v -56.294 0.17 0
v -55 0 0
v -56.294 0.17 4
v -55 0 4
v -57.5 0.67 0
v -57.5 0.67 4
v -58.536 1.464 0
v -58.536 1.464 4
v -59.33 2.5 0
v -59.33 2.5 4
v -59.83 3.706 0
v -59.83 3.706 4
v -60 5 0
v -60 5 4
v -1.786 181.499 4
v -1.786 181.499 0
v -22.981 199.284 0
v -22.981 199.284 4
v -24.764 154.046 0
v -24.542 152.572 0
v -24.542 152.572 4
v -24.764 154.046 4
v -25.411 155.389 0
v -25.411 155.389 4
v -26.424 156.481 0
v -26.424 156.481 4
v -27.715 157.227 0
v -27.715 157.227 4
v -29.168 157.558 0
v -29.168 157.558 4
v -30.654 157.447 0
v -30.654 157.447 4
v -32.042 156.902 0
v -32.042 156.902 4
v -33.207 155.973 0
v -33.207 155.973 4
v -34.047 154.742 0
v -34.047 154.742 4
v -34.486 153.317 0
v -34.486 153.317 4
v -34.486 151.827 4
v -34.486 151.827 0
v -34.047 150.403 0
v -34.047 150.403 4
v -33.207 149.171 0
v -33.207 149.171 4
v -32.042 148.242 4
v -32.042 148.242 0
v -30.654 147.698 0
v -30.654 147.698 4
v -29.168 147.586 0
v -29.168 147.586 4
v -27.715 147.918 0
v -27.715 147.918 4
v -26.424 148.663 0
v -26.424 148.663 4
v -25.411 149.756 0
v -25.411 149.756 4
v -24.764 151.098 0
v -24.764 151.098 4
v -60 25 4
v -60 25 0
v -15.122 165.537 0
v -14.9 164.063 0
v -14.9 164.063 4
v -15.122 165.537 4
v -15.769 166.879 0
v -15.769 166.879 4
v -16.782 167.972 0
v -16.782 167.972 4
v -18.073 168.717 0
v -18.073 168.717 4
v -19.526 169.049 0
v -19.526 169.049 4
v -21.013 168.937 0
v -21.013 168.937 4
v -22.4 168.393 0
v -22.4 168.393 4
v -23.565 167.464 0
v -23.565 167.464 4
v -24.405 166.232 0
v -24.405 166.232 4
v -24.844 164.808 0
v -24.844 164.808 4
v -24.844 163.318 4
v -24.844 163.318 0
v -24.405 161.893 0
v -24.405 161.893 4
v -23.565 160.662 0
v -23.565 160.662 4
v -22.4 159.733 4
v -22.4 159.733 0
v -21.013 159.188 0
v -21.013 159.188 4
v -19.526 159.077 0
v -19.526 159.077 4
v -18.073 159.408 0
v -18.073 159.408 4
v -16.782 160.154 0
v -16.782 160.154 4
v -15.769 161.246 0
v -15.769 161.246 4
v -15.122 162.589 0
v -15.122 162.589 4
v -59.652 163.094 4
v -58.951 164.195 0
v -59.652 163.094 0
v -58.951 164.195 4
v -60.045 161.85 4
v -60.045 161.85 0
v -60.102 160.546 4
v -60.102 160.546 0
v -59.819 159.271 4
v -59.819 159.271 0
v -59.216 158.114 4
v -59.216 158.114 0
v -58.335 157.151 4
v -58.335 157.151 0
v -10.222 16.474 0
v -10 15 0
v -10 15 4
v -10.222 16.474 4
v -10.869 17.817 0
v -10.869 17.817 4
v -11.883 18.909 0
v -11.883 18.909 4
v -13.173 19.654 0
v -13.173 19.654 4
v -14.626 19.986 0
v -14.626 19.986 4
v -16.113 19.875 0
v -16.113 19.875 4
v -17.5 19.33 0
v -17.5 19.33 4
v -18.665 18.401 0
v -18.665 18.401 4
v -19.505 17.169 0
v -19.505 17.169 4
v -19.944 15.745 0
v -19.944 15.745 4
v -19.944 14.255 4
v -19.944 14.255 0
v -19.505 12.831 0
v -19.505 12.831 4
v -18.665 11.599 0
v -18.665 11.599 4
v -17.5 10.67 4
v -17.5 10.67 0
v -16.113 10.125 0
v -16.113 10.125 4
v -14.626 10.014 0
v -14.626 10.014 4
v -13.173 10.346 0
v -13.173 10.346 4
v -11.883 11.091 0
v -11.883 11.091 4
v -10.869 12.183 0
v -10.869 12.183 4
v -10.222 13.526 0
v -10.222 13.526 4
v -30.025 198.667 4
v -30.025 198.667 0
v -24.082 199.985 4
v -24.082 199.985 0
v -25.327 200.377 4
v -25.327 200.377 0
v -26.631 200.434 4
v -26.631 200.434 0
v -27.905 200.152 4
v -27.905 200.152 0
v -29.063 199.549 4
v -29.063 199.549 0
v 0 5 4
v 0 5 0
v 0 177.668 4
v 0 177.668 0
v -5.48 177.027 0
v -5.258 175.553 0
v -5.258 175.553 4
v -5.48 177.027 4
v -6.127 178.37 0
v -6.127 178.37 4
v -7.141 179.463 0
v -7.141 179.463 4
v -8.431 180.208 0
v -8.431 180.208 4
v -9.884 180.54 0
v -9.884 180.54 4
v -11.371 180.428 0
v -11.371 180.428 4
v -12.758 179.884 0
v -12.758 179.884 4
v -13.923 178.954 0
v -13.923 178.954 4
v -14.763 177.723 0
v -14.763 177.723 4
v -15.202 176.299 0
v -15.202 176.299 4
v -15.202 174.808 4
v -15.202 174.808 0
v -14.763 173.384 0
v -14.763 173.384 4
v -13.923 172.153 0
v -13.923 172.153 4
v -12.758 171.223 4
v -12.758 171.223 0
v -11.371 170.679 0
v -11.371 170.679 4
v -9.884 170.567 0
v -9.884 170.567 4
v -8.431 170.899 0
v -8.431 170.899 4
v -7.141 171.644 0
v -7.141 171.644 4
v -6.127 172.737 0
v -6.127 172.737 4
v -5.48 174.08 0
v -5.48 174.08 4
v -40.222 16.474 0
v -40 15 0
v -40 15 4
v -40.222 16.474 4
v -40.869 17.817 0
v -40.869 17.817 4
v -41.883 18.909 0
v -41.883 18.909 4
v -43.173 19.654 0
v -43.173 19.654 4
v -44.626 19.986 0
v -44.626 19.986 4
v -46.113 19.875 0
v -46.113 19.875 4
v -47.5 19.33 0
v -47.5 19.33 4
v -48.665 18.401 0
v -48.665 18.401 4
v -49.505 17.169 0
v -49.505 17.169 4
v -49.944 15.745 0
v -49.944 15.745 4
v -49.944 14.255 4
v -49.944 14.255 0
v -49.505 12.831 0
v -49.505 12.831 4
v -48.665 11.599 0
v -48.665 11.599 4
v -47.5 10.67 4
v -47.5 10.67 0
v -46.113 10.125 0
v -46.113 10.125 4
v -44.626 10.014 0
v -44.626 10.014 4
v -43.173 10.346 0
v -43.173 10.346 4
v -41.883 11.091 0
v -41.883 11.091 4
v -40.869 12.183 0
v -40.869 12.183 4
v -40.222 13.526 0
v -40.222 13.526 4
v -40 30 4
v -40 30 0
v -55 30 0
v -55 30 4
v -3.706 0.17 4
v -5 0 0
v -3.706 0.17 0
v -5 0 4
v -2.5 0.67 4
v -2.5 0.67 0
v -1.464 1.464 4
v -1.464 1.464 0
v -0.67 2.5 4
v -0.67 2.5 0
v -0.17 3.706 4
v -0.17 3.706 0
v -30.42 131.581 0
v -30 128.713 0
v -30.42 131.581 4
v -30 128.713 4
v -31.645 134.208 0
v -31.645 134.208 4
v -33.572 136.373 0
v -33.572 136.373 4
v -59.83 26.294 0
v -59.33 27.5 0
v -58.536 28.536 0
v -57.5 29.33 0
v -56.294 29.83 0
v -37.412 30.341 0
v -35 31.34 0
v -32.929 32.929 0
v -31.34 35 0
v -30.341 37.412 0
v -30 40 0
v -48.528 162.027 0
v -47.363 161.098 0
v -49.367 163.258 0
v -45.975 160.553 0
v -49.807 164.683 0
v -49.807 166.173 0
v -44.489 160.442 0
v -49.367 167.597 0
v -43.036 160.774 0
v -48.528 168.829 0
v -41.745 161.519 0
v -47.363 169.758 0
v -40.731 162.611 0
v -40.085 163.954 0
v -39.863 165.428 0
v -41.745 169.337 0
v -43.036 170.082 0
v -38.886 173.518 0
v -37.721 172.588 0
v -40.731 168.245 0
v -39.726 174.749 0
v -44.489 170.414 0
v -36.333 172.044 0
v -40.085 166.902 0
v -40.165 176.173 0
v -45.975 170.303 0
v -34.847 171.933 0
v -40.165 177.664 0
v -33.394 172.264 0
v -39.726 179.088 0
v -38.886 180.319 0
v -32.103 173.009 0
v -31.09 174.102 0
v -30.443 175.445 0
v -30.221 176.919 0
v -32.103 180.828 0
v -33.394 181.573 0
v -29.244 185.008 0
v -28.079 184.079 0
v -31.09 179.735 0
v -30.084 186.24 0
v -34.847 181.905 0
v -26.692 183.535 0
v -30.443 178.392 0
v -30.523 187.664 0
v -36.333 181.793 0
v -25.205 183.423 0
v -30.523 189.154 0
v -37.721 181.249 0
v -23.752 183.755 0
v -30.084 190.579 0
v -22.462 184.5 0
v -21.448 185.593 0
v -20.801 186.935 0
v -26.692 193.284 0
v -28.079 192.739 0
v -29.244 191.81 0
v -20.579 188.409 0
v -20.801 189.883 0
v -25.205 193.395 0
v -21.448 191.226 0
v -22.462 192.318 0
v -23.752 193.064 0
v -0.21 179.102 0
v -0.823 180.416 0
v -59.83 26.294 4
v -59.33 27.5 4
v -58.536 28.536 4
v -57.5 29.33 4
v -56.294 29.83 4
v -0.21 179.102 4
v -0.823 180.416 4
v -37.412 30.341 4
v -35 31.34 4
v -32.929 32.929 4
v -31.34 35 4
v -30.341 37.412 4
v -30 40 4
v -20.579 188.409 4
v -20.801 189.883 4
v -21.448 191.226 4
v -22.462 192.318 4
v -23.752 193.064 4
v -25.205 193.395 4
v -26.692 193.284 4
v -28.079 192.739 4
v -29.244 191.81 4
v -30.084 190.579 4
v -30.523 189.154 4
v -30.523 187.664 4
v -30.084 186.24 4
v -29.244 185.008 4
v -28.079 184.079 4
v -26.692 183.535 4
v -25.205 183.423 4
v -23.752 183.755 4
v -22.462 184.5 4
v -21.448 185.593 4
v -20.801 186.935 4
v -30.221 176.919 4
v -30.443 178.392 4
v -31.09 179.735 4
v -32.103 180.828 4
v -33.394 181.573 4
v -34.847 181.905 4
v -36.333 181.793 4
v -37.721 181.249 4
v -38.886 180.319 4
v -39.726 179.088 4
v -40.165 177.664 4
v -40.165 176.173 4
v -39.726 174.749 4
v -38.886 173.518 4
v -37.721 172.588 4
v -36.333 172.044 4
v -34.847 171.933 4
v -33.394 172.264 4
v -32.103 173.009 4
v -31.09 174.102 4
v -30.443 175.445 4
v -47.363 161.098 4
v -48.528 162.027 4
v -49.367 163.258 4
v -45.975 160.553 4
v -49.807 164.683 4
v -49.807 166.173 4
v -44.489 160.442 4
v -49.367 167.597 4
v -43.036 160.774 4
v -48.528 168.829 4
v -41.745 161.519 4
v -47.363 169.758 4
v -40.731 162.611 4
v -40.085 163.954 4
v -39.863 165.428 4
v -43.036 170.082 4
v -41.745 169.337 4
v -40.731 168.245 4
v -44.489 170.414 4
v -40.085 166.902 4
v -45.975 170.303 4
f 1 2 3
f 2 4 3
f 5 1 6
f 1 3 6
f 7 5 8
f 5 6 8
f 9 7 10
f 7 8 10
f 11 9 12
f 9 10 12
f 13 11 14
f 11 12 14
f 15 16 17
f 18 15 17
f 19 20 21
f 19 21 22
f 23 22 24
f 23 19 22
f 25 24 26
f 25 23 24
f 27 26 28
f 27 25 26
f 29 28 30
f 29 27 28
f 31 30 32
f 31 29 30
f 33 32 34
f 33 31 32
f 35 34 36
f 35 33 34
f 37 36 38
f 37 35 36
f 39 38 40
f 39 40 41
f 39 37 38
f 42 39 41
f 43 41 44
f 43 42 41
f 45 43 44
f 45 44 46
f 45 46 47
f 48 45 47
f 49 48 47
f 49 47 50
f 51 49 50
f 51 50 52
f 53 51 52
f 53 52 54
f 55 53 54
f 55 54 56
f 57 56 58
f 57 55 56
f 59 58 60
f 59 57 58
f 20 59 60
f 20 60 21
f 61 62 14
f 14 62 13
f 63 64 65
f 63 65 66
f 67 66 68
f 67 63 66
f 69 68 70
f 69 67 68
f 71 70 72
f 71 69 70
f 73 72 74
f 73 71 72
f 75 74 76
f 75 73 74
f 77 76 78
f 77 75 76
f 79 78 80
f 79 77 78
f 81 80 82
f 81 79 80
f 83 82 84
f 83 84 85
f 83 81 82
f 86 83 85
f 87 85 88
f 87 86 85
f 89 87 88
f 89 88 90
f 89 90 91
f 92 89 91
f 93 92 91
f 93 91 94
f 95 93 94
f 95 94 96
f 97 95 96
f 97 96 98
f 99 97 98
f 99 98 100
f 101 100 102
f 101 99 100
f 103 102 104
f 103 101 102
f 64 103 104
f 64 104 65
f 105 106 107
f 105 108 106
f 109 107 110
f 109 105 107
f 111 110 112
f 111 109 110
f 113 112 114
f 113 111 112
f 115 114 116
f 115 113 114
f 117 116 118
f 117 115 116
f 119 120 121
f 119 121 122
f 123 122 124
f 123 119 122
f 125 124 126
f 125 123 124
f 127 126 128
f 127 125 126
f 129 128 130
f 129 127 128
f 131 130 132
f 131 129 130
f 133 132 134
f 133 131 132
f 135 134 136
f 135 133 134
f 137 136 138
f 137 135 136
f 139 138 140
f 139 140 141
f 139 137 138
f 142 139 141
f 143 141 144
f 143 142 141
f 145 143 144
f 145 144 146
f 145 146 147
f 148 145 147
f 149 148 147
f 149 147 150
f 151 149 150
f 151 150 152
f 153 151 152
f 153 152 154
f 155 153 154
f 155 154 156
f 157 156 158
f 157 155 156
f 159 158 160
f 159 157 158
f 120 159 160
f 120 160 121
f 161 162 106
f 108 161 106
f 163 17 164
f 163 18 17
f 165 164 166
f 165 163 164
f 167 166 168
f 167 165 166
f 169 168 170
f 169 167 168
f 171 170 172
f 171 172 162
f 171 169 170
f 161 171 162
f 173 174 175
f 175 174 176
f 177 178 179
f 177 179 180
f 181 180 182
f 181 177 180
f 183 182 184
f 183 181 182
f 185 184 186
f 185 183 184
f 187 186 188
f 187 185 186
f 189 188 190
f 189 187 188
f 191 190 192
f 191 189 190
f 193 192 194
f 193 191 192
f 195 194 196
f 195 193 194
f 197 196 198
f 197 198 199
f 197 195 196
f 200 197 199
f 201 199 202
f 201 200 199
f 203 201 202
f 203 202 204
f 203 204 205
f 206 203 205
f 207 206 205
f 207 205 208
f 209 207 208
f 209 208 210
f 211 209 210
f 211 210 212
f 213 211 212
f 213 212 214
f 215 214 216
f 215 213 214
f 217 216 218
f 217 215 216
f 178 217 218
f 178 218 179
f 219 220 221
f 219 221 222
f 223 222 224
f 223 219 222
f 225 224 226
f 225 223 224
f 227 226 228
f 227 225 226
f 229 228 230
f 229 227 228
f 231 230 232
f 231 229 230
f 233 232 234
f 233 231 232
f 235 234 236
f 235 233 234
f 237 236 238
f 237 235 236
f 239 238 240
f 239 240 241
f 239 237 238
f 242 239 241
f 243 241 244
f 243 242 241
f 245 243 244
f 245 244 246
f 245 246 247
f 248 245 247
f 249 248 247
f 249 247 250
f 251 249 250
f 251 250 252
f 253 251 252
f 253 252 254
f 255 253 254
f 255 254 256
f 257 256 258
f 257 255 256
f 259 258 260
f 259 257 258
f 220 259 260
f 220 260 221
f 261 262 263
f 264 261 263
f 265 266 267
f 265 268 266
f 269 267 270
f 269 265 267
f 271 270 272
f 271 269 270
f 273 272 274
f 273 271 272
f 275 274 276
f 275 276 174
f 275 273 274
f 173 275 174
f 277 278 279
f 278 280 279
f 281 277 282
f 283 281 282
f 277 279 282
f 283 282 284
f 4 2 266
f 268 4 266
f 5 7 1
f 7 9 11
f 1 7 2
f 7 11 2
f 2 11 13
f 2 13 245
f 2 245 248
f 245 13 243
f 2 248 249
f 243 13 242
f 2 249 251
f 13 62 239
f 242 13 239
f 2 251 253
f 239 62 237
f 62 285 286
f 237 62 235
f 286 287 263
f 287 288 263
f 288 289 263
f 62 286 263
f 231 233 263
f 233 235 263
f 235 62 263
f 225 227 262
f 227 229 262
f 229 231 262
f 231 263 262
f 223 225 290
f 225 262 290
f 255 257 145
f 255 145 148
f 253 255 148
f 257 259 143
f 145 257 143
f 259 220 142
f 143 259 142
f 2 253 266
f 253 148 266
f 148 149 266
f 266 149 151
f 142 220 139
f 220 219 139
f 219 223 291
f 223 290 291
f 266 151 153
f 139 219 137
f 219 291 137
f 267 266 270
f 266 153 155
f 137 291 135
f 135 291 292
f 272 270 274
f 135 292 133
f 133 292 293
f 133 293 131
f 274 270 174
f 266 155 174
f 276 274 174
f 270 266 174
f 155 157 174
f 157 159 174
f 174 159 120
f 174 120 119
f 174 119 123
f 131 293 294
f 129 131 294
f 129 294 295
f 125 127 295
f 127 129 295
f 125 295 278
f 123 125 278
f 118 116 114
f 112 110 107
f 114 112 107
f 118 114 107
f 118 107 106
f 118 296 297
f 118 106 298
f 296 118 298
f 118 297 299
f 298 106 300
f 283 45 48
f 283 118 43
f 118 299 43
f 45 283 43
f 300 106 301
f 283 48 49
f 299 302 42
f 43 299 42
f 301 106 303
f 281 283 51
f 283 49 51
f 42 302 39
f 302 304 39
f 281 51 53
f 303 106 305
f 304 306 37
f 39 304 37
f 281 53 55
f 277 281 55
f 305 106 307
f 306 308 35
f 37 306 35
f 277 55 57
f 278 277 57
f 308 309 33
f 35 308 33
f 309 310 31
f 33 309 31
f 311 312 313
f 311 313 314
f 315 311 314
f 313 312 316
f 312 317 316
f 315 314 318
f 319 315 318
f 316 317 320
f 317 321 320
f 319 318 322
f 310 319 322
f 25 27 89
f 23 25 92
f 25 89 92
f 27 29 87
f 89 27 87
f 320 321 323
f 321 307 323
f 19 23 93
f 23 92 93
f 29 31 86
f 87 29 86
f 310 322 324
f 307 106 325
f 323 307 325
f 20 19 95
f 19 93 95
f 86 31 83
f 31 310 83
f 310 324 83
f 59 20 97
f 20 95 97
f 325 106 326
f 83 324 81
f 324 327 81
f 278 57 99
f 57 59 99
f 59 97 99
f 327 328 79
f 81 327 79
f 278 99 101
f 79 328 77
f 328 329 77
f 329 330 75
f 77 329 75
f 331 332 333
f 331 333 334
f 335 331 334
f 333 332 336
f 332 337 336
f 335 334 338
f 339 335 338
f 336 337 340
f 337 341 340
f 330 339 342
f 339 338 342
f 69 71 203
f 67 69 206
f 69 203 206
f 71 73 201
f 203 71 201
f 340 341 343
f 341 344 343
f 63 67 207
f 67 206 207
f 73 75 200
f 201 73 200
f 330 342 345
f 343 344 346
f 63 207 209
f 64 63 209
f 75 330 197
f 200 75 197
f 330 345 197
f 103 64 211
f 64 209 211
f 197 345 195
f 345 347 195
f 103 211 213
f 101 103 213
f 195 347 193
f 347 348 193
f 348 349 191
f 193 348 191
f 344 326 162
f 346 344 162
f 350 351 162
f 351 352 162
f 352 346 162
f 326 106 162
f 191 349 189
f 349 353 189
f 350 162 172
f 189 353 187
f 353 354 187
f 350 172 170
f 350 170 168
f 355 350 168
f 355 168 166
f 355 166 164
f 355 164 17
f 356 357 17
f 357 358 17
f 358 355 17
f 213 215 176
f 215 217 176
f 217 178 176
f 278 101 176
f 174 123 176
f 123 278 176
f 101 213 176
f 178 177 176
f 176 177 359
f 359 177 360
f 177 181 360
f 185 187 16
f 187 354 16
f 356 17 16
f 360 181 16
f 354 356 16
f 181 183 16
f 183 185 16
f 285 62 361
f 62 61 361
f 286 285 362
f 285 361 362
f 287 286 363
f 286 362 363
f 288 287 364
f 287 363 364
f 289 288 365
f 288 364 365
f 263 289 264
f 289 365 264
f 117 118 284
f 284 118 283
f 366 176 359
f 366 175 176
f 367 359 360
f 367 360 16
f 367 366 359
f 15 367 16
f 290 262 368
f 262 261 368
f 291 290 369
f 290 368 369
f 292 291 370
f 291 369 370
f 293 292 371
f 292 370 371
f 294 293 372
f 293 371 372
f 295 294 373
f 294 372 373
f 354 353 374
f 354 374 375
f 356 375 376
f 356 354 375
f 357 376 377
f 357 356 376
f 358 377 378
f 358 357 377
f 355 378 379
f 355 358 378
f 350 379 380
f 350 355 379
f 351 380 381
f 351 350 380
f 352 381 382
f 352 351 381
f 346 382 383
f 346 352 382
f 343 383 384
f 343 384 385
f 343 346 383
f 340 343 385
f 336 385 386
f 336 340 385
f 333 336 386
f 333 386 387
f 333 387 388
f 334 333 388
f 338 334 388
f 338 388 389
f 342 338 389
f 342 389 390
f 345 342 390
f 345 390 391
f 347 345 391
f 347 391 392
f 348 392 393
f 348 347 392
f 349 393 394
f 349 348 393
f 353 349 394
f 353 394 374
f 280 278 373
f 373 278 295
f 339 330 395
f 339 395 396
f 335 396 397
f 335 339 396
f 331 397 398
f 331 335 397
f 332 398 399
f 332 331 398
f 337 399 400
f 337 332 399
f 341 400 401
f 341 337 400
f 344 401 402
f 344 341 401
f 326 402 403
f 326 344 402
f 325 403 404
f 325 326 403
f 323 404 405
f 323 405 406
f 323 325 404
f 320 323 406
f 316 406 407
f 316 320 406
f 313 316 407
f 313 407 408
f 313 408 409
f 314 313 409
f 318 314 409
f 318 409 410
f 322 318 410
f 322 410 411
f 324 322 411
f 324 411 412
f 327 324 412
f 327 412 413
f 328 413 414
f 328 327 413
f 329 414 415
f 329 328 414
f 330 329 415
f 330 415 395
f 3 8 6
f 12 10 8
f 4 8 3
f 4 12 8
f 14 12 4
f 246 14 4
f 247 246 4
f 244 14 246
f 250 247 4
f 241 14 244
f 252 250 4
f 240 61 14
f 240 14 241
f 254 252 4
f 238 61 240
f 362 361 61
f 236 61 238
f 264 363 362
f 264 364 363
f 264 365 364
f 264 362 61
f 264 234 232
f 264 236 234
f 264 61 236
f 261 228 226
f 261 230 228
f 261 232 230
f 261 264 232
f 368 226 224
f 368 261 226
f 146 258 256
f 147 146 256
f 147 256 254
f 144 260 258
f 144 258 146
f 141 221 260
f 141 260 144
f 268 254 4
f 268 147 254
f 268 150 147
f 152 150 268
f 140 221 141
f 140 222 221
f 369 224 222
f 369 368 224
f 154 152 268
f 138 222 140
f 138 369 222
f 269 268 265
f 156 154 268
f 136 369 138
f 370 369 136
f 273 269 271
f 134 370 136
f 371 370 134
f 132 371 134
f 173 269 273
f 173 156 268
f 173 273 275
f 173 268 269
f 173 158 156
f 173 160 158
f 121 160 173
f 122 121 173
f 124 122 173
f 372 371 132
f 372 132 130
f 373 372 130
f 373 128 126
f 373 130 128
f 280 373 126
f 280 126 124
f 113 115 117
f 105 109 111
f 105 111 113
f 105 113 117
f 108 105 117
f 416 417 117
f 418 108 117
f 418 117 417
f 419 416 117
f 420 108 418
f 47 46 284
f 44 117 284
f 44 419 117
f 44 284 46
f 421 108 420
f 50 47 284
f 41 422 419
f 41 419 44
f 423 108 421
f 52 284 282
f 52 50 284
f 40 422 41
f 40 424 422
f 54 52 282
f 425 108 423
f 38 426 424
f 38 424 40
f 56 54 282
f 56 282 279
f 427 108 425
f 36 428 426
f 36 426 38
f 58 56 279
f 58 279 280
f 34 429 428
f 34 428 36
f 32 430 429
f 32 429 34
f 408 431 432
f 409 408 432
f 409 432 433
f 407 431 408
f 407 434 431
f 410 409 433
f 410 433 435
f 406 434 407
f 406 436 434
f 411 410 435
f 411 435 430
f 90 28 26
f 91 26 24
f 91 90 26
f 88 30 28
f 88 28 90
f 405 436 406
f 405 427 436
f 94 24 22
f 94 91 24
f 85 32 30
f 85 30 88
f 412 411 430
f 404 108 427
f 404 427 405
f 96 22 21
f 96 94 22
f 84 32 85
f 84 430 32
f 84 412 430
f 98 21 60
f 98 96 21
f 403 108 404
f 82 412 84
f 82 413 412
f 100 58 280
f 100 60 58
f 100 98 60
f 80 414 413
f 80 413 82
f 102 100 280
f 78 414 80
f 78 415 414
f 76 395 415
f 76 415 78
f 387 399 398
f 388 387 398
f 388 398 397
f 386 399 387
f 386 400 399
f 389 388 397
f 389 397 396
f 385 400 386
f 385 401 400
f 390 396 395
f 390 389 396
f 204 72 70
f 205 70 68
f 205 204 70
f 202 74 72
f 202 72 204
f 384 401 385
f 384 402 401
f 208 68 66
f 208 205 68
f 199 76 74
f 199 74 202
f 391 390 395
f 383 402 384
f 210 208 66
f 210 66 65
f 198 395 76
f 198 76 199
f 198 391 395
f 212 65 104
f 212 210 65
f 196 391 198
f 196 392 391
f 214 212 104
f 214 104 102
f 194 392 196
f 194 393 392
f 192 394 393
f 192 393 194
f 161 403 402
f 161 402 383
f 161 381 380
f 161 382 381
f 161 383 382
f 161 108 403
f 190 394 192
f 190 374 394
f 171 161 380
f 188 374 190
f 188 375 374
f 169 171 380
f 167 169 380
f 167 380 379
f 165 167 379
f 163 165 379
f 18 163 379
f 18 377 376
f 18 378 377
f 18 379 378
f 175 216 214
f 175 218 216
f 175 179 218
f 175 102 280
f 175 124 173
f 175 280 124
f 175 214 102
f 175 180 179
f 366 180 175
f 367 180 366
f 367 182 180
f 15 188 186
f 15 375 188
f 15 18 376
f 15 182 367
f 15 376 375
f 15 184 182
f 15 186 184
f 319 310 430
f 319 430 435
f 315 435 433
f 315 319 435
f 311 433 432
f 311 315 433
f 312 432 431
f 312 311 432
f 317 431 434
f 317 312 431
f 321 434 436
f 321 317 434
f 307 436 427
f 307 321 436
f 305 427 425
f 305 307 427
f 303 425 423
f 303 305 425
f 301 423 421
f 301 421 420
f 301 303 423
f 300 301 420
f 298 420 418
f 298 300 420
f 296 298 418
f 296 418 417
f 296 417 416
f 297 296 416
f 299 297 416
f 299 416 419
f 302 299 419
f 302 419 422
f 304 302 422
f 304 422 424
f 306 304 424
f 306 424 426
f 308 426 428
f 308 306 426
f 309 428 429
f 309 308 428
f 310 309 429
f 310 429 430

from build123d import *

# Parameters (mm, degrees)
F0_R     = 5
F1_DEPTH = 4
F2_R     = 5
F3_R     = 10


with BuildPart() as f1:
    # F0 (on Top) → F1 (new body)
    with BuildSketch(Plane.XY):
        Polygon((-60, 0), (0, 0), (0, 180), (-26.811556, 202.497566), (-62.164874, 160.365122), (-30, 133.375588), (-30, 30), (-60, 30), align=None)
        with Locations((-45, 15)):
            Circle(F0_R, mode=Mode.SUBTRACT)
        with Locations((-15, 15)):
            Circle(F0_R, mode=Mode.SUBTRACT)
        with Locations((-44.862615, 165.427913)):
            Circle(F0_R, mode=Mode.SUBTRACT)
        with Locations((-35.220801, 176.918579)):
            Circle(F0_R, mode=Mode.SUBTRACT)
        with Locations((-29.541727, 152.57216)):
            Circle(F0_R, mode=Mode.SUBTRACT)
        with Locations((-19.899912, 164.062827)):
            Circle(F0_R, mode=Mode.SUBTRACT)
        with Locations((-25.578987, 188.409246)):
            Circle(F0_R, mode=Mode.SUBTRACT)
        with Locations((-10.258098, 175.553494)):
            Circle(F0_R, mode=Mode.SUBTRACT)
    extrude(amount=F1_DEPTH)

    # F2
    f2_edges = [f1.edges().sort_by_distance(p)[0] for p in [
        (-62.164874, 160.365122, 2),
        (-26.811556, 202.497566, 2),
        (0, 180, 2),
        (0, 0, 2),
        (-60, 0, 2),
        (-60, 30, 2),
    ]]
    fillet(f2_edges, radius=F2_R)

    # F3
    f3_edges = [f1.edges().sort_by_distance(p)[0] for p in [
        (-30, 30, 2),
        (-30, 133.375588, 2),
    ]]
    fillet(f3_edges, radius=F3_R)


solid = f1.part
